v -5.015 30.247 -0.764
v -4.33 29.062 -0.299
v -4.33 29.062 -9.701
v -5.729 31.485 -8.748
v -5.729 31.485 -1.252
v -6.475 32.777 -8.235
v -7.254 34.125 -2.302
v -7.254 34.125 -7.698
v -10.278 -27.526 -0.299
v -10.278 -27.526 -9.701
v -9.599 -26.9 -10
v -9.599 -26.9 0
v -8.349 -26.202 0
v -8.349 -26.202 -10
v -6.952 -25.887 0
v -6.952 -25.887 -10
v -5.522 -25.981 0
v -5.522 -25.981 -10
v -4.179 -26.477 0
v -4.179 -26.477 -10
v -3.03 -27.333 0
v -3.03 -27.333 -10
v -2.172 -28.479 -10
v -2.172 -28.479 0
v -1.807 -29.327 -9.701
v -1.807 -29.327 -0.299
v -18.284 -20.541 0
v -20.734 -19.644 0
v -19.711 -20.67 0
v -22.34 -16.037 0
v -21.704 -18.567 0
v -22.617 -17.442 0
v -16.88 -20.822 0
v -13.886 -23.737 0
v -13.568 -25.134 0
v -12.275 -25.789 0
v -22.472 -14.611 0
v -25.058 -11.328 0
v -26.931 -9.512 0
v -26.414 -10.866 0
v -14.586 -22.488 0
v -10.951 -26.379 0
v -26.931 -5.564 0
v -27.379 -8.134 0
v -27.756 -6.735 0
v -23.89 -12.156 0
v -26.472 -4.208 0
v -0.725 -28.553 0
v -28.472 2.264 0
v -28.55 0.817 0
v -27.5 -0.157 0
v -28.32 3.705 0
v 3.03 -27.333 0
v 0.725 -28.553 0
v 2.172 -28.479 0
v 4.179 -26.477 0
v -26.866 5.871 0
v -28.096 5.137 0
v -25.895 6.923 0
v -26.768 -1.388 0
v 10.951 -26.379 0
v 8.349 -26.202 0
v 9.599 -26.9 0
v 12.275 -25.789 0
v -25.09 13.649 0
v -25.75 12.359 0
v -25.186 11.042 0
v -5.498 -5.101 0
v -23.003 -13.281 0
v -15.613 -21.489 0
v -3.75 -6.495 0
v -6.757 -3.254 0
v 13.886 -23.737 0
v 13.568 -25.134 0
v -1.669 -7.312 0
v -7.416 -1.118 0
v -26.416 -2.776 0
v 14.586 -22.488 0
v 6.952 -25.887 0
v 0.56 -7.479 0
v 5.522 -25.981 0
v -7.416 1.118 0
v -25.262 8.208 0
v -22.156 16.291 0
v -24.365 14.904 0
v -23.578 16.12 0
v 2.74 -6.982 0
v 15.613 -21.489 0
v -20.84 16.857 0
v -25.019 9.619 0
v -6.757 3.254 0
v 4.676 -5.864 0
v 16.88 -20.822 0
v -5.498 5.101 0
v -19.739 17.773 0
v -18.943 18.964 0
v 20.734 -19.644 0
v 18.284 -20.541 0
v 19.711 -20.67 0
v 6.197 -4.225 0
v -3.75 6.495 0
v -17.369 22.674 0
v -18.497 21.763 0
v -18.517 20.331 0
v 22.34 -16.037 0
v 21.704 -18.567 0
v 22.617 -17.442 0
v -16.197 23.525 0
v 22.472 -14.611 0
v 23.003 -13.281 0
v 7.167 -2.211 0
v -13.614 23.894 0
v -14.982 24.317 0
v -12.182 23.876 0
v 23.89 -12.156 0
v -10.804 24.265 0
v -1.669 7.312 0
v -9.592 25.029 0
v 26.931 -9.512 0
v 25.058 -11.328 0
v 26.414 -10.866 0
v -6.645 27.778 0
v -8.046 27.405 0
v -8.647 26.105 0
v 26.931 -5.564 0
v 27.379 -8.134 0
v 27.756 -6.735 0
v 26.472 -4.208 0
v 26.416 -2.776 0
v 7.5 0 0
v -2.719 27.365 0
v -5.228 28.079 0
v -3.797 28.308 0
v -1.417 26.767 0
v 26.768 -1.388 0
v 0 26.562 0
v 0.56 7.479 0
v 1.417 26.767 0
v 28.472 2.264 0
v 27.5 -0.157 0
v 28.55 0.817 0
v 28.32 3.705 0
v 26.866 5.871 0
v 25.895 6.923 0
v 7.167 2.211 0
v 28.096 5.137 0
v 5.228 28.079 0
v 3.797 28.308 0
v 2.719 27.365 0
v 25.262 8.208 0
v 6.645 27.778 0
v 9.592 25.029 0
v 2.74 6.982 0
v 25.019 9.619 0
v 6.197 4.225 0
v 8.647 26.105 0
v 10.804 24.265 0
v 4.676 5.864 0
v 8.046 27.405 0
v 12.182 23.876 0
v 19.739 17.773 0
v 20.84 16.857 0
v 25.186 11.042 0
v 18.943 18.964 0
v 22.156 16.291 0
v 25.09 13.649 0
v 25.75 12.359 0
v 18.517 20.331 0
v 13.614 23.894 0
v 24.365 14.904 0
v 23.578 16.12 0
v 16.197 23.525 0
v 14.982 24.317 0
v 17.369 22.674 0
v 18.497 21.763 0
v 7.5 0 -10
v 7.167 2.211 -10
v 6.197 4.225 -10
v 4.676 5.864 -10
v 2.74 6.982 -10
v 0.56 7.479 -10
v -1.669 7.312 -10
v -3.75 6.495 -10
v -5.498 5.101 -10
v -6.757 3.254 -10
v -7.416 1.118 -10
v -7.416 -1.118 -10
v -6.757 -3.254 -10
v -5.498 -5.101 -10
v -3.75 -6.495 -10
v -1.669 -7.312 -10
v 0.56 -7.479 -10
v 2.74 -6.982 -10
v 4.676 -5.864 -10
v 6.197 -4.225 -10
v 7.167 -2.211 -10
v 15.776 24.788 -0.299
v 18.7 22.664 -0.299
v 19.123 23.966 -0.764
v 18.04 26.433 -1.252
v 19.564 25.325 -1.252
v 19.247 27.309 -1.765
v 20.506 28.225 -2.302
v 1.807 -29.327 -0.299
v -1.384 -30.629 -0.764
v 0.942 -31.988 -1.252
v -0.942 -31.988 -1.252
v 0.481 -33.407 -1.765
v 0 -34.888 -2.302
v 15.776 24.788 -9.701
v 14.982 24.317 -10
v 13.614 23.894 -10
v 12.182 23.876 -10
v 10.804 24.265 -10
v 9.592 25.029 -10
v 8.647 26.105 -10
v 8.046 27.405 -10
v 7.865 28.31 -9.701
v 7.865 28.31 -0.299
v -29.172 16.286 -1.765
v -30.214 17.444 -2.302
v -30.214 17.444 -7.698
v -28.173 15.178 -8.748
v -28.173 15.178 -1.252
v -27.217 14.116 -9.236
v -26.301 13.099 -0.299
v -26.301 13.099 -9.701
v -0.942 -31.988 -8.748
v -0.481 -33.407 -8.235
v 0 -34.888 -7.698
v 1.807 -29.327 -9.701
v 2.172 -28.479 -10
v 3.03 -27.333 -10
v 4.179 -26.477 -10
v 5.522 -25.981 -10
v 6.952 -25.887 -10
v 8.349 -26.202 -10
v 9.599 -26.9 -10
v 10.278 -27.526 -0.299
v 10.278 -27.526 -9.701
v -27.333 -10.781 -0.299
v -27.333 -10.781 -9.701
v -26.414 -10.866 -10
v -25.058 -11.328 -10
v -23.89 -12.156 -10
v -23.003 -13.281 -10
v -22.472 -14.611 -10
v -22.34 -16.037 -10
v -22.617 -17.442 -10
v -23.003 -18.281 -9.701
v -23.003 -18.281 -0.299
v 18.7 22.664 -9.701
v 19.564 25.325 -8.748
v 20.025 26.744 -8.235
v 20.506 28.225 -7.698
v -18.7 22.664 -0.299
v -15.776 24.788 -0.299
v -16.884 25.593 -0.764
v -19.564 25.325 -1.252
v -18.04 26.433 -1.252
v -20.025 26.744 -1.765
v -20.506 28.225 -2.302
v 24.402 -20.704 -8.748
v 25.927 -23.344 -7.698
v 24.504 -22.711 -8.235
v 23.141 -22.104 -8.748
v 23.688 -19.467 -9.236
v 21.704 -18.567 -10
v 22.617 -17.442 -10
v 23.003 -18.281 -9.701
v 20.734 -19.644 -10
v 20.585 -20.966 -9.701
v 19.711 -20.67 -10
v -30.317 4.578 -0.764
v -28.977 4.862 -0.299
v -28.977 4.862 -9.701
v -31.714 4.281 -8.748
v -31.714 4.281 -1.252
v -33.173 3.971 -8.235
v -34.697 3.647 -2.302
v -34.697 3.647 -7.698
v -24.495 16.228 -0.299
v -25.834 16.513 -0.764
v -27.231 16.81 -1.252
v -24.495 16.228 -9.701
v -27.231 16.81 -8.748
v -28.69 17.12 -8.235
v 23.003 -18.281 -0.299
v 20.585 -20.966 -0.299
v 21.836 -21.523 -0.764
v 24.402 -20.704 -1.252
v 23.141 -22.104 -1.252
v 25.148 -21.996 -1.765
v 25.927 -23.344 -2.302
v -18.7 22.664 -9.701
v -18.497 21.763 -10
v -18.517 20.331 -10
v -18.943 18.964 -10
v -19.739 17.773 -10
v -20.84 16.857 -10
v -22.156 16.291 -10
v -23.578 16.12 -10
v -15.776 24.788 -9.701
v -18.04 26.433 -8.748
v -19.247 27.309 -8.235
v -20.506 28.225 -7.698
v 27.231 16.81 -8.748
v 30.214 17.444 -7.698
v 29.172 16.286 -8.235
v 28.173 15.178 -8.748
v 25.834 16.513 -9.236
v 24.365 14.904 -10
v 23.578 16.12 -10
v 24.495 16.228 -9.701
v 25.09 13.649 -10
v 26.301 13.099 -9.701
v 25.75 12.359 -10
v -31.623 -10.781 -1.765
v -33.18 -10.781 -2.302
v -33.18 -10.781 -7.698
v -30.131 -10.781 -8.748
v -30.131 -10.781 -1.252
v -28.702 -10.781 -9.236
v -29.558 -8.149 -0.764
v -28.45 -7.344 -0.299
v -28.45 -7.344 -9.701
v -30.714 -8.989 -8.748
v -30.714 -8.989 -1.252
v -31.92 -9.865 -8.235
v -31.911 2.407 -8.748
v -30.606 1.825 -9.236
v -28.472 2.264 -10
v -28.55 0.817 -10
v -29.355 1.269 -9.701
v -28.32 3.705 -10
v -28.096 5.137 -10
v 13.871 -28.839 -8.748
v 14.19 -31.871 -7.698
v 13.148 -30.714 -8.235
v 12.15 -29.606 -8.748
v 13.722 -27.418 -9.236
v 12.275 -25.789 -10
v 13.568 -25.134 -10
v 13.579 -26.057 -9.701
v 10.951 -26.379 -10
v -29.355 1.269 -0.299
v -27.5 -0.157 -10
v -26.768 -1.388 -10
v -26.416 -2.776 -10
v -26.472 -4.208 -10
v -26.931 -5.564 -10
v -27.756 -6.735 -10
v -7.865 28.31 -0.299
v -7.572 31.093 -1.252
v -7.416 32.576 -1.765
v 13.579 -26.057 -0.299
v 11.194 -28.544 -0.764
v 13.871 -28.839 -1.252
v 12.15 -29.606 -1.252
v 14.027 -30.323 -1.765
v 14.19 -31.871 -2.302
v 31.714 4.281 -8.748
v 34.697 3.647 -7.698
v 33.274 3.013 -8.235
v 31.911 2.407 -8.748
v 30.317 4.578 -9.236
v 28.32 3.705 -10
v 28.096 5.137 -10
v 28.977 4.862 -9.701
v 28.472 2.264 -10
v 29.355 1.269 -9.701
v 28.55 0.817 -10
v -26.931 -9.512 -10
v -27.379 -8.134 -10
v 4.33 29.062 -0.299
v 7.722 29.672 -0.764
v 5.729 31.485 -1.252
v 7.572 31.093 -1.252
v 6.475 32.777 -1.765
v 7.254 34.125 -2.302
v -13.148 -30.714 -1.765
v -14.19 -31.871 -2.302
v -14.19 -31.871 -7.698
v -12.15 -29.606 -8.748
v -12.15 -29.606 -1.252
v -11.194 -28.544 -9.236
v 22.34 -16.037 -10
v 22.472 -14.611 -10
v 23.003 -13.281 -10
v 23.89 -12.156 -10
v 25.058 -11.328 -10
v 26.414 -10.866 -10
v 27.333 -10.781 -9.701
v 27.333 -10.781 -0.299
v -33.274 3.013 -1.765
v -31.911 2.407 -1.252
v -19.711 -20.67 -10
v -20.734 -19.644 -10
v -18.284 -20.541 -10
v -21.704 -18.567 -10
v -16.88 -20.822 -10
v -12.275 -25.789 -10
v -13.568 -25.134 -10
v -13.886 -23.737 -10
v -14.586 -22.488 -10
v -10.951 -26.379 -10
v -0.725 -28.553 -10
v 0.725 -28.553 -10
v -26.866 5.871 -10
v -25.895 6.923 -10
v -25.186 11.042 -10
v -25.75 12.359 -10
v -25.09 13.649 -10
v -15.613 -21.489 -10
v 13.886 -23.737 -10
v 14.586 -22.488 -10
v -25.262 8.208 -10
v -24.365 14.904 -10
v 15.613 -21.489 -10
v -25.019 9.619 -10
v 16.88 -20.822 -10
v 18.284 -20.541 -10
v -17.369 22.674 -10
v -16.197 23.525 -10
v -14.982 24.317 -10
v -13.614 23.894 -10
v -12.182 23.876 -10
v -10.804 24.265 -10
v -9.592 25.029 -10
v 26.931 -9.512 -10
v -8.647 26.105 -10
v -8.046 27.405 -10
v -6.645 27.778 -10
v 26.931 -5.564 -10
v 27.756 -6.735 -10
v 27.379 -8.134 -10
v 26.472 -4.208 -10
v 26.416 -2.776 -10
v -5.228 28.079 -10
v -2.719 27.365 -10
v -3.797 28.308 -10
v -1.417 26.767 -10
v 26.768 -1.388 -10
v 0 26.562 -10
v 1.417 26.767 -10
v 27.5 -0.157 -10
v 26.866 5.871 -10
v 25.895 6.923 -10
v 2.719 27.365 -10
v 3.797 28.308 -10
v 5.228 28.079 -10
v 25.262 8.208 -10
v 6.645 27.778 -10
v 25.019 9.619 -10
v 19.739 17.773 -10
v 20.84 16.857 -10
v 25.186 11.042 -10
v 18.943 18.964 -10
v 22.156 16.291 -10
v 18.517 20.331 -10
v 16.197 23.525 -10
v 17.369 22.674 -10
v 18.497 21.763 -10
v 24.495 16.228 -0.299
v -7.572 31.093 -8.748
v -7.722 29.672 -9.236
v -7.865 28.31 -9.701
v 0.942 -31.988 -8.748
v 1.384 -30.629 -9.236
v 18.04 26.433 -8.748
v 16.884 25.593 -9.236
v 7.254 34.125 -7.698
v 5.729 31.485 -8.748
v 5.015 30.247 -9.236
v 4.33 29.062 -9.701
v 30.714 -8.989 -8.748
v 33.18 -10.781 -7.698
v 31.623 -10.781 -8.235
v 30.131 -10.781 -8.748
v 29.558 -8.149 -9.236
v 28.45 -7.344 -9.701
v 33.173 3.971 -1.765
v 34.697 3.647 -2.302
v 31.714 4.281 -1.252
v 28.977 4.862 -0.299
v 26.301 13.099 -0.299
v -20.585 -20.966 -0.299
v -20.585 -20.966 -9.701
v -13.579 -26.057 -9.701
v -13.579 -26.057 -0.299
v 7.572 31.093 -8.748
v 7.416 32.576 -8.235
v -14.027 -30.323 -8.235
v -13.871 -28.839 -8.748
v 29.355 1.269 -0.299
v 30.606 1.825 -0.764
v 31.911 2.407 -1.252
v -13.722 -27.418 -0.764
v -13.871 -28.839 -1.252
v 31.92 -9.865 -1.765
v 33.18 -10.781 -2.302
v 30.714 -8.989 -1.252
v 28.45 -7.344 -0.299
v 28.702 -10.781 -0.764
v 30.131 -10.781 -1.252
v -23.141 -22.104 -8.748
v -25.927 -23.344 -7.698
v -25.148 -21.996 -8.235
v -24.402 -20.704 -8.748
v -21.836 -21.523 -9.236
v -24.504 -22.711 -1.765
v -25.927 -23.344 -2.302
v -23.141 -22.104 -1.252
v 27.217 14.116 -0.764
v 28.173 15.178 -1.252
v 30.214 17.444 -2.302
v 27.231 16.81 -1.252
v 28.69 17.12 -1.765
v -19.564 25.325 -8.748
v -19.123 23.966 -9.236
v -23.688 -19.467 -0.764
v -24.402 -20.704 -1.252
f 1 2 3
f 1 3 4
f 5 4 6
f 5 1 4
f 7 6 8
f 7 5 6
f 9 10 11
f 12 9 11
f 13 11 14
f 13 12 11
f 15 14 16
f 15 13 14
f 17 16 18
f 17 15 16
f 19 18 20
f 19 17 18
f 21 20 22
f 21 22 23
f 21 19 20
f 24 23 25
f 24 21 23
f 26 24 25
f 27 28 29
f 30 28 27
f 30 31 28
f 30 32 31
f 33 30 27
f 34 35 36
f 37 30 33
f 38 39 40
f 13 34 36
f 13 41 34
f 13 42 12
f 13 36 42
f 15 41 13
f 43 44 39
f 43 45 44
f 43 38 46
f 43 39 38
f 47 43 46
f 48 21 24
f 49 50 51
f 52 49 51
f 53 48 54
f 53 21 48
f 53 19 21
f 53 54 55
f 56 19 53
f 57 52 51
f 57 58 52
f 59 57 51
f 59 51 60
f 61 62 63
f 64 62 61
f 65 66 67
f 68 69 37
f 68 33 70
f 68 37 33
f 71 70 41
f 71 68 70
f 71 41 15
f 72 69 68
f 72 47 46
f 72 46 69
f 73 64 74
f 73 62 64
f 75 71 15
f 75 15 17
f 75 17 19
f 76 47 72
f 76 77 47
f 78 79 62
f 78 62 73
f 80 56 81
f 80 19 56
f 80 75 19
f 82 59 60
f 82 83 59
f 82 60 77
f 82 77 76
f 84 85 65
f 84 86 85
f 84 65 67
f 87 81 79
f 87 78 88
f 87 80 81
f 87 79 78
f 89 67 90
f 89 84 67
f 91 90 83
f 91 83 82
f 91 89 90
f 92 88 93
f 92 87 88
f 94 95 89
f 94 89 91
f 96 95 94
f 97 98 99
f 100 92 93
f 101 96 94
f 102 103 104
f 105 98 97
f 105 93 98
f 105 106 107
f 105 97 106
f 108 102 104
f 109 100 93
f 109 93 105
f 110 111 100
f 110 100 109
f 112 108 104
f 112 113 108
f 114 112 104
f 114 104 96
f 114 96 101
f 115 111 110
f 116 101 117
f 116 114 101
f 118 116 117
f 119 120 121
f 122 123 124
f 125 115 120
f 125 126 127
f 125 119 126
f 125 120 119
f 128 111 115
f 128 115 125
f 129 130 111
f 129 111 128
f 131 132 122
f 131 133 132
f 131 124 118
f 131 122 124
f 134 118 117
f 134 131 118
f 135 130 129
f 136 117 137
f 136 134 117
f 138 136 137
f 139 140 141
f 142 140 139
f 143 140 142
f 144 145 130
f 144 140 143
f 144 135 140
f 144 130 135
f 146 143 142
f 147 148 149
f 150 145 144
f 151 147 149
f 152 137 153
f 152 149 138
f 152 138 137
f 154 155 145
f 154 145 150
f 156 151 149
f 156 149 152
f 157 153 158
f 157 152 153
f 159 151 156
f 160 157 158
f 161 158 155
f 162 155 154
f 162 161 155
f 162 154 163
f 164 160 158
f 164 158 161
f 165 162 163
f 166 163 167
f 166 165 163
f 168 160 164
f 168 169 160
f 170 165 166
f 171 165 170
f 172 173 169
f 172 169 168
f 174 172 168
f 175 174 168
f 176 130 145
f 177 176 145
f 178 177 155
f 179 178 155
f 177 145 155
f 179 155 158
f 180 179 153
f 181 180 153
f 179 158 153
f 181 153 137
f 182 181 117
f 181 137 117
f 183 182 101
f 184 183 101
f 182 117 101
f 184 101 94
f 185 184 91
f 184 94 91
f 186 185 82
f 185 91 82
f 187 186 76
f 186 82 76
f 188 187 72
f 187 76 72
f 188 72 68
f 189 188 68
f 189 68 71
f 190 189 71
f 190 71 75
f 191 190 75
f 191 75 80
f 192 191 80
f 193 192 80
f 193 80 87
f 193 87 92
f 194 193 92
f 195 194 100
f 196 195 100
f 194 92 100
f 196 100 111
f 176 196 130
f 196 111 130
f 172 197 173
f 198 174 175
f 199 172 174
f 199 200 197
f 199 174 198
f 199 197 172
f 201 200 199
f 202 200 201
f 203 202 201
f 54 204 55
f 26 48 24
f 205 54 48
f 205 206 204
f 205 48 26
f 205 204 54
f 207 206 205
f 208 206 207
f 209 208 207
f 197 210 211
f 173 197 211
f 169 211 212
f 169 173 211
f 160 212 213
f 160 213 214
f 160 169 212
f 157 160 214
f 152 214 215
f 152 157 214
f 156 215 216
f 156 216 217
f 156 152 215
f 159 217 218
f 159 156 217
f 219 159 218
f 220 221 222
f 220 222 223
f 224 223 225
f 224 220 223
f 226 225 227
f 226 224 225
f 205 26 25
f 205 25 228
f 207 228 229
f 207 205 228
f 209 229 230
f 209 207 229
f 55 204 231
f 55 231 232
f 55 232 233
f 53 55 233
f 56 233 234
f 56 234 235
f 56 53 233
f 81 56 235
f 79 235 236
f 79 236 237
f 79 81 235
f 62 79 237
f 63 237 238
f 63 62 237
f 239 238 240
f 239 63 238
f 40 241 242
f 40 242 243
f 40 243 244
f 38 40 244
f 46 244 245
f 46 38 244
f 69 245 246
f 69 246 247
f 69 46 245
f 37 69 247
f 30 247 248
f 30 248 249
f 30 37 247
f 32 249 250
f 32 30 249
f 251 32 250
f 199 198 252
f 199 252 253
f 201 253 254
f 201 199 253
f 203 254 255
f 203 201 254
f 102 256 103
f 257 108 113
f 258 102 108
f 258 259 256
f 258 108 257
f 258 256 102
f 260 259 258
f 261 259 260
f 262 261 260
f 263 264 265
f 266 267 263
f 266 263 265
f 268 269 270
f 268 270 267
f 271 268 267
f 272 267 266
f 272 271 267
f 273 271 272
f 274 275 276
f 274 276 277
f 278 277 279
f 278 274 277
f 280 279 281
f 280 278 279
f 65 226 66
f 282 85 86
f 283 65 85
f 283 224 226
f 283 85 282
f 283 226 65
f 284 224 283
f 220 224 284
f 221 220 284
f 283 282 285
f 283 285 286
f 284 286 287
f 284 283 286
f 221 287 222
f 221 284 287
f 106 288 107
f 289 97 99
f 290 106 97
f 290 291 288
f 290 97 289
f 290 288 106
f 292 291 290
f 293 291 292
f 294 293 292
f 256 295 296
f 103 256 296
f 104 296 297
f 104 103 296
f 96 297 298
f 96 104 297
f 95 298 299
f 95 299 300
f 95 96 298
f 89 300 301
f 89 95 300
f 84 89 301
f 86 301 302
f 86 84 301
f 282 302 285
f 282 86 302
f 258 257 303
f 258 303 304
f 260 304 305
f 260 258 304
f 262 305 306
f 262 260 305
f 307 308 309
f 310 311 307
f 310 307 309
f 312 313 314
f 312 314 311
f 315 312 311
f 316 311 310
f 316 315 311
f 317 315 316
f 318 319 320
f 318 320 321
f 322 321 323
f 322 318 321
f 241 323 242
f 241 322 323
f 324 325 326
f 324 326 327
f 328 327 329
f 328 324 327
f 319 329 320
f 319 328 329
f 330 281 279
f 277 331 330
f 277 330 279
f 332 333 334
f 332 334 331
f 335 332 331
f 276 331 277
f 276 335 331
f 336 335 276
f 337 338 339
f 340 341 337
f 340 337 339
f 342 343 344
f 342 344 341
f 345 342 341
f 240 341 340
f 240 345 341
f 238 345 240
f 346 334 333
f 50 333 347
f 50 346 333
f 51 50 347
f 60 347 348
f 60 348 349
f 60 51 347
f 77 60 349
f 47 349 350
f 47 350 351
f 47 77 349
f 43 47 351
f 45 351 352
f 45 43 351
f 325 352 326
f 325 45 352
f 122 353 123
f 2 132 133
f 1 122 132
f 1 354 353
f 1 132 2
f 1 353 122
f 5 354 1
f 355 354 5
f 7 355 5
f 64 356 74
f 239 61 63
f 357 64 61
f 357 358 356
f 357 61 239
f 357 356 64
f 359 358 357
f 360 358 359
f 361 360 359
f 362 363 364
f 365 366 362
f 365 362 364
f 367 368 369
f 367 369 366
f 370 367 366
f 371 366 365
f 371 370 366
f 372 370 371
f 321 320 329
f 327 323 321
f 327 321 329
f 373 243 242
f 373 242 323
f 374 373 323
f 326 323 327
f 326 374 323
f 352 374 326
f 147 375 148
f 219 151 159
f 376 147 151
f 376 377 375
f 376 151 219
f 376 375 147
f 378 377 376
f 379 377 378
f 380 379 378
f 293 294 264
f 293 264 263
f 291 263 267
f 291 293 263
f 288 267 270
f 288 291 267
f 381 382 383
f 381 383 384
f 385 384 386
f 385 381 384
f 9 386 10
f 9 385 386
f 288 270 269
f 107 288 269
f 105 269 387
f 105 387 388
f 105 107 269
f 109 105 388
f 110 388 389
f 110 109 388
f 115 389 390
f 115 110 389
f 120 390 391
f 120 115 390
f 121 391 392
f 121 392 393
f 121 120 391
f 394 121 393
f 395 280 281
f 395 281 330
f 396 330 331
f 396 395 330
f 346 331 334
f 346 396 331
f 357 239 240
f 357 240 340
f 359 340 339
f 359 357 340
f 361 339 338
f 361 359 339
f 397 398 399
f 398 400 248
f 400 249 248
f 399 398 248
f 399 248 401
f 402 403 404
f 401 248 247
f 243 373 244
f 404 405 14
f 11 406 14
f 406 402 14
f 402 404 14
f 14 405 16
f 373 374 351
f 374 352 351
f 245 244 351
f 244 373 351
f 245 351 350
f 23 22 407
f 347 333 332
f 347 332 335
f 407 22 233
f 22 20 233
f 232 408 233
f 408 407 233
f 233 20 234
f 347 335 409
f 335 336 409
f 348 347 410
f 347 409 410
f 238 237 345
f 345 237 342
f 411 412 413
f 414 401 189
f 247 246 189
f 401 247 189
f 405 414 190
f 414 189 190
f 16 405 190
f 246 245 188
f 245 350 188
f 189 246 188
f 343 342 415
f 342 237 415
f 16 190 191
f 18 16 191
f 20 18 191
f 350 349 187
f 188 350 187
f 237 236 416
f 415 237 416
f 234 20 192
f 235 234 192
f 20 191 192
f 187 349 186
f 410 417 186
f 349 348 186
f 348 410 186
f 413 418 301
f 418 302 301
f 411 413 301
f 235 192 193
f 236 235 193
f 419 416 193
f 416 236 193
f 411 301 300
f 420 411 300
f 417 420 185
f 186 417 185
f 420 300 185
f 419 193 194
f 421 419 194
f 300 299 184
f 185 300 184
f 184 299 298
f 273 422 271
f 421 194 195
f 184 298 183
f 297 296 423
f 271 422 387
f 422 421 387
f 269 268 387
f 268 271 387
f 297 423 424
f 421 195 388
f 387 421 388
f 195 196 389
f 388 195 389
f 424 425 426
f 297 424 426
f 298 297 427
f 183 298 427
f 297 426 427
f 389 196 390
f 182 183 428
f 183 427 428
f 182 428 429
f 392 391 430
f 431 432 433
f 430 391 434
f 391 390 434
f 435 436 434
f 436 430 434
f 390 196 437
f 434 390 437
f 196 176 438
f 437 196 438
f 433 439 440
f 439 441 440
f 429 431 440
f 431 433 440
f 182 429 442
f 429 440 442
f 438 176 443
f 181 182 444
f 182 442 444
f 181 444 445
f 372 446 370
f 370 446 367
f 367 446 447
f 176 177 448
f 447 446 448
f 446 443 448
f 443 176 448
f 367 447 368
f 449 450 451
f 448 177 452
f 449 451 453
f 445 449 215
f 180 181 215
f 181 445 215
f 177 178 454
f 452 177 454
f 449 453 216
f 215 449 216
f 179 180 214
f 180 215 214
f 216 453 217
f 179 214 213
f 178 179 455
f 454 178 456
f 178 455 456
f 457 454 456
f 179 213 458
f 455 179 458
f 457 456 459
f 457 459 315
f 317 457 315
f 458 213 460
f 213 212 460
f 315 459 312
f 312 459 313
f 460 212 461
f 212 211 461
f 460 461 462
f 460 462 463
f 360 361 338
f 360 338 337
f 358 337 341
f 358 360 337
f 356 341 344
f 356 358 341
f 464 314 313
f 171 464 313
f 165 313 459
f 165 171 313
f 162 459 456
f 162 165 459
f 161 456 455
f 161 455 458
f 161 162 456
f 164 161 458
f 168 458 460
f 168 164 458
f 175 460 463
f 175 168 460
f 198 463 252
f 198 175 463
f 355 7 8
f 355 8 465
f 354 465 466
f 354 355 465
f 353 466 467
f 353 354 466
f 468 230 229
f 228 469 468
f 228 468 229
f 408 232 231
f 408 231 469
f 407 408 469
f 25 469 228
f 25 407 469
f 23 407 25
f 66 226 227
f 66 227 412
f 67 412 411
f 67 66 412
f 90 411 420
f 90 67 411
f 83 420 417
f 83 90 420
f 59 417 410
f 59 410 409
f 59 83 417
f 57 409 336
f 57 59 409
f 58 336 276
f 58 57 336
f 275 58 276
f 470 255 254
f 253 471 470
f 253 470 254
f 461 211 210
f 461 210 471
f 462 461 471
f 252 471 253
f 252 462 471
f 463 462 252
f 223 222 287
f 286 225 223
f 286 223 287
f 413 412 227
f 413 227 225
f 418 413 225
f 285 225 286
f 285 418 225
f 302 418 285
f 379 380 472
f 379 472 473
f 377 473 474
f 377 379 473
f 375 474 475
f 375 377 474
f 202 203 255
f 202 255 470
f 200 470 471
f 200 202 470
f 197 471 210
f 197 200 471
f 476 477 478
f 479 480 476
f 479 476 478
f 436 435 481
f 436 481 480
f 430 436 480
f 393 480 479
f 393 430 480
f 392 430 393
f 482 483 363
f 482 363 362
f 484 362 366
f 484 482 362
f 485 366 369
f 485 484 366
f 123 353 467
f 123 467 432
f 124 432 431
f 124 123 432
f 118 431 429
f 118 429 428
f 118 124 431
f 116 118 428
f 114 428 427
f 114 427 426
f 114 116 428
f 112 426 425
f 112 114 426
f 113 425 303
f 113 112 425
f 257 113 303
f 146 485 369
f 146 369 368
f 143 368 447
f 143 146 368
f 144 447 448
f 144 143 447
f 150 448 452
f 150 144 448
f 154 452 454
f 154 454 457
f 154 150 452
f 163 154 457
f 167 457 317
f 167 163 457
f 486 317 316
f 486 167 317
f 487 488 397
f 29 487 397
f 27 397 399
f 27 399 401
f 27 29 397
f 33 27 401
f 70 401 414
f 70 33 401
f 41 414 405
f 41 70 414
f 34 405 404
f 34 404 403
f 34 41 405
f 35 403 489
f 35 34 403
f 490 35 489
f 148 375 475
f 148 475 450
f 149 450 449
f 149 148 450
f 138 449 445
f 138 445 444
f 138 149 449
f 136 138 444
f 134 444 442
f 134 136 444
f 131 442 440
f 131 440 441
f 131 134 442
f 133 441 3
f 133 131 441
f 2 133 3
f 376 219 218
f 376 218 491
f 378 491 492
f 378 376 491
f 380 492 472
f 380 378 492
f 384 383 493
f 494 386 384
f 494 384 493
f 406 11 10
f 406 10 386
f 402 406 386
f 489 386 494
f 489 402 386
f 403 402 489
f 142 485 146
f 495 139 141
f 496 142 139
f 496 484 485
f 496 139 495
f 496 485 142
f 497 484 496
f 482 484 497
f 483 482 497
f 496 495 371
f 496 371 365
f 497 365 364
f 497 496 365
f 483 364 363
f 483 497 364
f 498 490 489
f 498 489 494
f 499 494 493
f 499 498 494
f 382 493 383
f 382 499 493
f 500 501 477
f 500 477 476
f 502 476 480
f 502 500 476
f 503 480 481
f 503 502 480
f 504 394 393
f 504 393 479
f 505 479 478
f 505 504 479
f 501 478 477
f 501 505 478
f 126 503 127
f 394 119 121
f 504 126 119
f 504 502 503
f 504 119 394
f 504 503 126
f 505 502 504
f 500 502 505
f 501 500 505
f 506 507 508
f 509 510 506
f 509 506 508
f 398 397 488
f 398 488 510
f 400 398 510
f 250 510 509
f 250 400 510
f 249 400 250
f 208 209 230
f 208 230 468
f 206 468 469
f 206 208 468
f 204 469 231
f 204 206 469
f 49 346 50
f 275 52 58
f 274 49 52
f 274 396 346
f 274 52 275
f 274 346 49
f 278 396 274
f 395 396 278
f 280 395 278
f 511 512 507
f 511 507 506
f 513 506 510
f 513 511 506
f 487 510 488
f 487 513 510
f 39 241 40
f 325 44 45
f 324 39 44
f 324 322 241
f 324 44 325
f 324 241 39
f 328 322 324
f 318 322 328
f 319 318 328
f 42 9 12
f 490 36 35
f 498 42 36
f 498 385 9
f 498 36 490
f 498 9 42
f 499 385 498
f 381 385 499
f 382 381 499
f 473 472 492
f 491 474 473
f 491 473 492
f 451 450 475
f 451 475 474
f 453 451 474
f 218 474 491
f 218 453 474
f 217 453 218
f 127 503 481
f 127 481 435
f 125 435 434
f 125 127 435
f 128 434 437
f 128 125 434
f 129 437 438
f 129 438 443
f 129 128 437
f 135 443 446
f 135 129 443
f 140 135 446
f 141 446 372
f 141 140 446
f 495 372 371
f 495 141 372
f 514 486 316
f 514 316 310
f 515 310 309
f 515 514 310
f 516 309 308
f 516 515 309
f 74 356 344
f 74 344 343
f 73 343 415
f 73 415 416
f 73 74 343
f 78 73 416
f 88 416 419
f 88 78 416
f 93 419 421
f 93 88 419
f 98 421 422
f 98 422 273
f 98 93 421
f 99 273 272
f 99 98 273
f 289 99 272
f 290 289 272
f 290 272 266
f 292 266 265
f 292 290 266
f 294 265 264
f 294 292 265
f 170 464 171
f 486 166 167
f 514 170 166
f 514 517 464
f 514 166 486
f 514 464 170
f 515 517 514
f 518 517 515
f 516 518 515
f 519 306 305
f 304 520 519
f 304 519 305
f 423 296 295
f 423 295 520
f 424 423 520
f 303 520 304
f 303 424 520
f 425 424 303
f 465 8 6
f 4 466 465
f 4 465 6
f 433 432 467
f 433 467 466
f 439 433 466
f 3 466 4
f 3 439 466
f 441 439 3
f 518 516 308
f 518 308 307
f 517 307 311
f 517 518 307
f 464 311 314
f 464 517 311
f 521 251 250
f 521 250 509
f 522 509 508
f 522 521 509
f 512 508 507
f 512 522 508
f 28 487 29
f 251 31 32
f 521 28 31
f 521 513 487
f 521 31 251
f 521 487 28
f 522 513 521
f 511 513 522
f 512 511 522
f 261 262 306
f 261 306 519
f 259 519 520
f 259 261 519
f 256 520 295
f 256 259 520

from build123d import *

# Parameters (mm, degrees)
IZIM1_R                     = 35
Y_KSEKLIK_EKSTR_ZYON1_DEPTH = 10
KES_EKSTR_ZYON1_DEPTH       = 10
DAIRESEL_KAPLAMA1_COUNT     = 15
IZIM8_R                     = 7.5
KES_EKSTR_ZYON2_DEPTH       = 10


with BuildPart() as part:
    # Çizim1 → Yükseklik-Ekstrüzyon1 (new body)
    with BuildSketch(Plane.XY):
        Circle(IZIM1_R)
    extrude(amount=-Y_KSEKLIK_EKSTR_ZYON1_DEPTH)

    # Çizim2 → Kes-Ekstrüzyon1 (cut)
    with BuildSketch(Plane.XY):
        with BuildLine():
            Line((-4.330127019, 29.061737365), (-9.008699853, 37.16526322))
            Line((-9.008699853, 37.16526322), (9.008699853, 37.16526322))
            Line((9.008699853, 37.16526322), (4.330127019, 29.061737365))
            ThreePointArc((4.330127019, 29.061737365), (0, 26.561737365), (-4.330127019, 29.061737365))
        make_face()
    kes_ekstr_zyon1 = extrude(amount=-KES_EKSTR_ZYON1_DEPTH, mode=Mode.SUBTRACT)

    # Dairesel Kaplama1: Kes-Ekstrüzyon1 ×15 about axis
    dairesel_kaplama1_axis = Axis((0, 0, 0), (0, 0, 1))
    for i in range(1, DAIRESEL_KAPLAMA1_COUNT):
        add(kes_ekstr_zyon1.rotate(dairesel_kaplama1_axis, i * 360 / DAIRESEL_KAPLAMA1_COUNT), mode=Mode.SUBTRACT)

    # Çizim8 → Kes-Ekstrüzyon2 (cut)
    with BuildSketch(Plane.XY):
        Circle(IZIM8_R)
    extrude(amount=-KES_EKSTR_ZYON2_DEPTH, mode=Mode.SUBTRACT)

    # Çizim11 → Kes-Döndür1 (revolve, cut)
    with BuildSketch(Plane(origin=(0, 0, 0), x_dir=(0, 0, -1), z_dir=(1, 0, 0))):
        Polygon((0, 28.561737365), (2.911761874, 36.561737365), (0, 36.561737365), align=None)
        Polygon((10, 36.561737365), (7.088238126, 36.561737365), (10, 28.561737365), align=None)
    revolve(axis=Axis((0, 0, 2.836239844), (0, 0, -1)), mode=Mode.SUBTRACT)


solid = part.part
